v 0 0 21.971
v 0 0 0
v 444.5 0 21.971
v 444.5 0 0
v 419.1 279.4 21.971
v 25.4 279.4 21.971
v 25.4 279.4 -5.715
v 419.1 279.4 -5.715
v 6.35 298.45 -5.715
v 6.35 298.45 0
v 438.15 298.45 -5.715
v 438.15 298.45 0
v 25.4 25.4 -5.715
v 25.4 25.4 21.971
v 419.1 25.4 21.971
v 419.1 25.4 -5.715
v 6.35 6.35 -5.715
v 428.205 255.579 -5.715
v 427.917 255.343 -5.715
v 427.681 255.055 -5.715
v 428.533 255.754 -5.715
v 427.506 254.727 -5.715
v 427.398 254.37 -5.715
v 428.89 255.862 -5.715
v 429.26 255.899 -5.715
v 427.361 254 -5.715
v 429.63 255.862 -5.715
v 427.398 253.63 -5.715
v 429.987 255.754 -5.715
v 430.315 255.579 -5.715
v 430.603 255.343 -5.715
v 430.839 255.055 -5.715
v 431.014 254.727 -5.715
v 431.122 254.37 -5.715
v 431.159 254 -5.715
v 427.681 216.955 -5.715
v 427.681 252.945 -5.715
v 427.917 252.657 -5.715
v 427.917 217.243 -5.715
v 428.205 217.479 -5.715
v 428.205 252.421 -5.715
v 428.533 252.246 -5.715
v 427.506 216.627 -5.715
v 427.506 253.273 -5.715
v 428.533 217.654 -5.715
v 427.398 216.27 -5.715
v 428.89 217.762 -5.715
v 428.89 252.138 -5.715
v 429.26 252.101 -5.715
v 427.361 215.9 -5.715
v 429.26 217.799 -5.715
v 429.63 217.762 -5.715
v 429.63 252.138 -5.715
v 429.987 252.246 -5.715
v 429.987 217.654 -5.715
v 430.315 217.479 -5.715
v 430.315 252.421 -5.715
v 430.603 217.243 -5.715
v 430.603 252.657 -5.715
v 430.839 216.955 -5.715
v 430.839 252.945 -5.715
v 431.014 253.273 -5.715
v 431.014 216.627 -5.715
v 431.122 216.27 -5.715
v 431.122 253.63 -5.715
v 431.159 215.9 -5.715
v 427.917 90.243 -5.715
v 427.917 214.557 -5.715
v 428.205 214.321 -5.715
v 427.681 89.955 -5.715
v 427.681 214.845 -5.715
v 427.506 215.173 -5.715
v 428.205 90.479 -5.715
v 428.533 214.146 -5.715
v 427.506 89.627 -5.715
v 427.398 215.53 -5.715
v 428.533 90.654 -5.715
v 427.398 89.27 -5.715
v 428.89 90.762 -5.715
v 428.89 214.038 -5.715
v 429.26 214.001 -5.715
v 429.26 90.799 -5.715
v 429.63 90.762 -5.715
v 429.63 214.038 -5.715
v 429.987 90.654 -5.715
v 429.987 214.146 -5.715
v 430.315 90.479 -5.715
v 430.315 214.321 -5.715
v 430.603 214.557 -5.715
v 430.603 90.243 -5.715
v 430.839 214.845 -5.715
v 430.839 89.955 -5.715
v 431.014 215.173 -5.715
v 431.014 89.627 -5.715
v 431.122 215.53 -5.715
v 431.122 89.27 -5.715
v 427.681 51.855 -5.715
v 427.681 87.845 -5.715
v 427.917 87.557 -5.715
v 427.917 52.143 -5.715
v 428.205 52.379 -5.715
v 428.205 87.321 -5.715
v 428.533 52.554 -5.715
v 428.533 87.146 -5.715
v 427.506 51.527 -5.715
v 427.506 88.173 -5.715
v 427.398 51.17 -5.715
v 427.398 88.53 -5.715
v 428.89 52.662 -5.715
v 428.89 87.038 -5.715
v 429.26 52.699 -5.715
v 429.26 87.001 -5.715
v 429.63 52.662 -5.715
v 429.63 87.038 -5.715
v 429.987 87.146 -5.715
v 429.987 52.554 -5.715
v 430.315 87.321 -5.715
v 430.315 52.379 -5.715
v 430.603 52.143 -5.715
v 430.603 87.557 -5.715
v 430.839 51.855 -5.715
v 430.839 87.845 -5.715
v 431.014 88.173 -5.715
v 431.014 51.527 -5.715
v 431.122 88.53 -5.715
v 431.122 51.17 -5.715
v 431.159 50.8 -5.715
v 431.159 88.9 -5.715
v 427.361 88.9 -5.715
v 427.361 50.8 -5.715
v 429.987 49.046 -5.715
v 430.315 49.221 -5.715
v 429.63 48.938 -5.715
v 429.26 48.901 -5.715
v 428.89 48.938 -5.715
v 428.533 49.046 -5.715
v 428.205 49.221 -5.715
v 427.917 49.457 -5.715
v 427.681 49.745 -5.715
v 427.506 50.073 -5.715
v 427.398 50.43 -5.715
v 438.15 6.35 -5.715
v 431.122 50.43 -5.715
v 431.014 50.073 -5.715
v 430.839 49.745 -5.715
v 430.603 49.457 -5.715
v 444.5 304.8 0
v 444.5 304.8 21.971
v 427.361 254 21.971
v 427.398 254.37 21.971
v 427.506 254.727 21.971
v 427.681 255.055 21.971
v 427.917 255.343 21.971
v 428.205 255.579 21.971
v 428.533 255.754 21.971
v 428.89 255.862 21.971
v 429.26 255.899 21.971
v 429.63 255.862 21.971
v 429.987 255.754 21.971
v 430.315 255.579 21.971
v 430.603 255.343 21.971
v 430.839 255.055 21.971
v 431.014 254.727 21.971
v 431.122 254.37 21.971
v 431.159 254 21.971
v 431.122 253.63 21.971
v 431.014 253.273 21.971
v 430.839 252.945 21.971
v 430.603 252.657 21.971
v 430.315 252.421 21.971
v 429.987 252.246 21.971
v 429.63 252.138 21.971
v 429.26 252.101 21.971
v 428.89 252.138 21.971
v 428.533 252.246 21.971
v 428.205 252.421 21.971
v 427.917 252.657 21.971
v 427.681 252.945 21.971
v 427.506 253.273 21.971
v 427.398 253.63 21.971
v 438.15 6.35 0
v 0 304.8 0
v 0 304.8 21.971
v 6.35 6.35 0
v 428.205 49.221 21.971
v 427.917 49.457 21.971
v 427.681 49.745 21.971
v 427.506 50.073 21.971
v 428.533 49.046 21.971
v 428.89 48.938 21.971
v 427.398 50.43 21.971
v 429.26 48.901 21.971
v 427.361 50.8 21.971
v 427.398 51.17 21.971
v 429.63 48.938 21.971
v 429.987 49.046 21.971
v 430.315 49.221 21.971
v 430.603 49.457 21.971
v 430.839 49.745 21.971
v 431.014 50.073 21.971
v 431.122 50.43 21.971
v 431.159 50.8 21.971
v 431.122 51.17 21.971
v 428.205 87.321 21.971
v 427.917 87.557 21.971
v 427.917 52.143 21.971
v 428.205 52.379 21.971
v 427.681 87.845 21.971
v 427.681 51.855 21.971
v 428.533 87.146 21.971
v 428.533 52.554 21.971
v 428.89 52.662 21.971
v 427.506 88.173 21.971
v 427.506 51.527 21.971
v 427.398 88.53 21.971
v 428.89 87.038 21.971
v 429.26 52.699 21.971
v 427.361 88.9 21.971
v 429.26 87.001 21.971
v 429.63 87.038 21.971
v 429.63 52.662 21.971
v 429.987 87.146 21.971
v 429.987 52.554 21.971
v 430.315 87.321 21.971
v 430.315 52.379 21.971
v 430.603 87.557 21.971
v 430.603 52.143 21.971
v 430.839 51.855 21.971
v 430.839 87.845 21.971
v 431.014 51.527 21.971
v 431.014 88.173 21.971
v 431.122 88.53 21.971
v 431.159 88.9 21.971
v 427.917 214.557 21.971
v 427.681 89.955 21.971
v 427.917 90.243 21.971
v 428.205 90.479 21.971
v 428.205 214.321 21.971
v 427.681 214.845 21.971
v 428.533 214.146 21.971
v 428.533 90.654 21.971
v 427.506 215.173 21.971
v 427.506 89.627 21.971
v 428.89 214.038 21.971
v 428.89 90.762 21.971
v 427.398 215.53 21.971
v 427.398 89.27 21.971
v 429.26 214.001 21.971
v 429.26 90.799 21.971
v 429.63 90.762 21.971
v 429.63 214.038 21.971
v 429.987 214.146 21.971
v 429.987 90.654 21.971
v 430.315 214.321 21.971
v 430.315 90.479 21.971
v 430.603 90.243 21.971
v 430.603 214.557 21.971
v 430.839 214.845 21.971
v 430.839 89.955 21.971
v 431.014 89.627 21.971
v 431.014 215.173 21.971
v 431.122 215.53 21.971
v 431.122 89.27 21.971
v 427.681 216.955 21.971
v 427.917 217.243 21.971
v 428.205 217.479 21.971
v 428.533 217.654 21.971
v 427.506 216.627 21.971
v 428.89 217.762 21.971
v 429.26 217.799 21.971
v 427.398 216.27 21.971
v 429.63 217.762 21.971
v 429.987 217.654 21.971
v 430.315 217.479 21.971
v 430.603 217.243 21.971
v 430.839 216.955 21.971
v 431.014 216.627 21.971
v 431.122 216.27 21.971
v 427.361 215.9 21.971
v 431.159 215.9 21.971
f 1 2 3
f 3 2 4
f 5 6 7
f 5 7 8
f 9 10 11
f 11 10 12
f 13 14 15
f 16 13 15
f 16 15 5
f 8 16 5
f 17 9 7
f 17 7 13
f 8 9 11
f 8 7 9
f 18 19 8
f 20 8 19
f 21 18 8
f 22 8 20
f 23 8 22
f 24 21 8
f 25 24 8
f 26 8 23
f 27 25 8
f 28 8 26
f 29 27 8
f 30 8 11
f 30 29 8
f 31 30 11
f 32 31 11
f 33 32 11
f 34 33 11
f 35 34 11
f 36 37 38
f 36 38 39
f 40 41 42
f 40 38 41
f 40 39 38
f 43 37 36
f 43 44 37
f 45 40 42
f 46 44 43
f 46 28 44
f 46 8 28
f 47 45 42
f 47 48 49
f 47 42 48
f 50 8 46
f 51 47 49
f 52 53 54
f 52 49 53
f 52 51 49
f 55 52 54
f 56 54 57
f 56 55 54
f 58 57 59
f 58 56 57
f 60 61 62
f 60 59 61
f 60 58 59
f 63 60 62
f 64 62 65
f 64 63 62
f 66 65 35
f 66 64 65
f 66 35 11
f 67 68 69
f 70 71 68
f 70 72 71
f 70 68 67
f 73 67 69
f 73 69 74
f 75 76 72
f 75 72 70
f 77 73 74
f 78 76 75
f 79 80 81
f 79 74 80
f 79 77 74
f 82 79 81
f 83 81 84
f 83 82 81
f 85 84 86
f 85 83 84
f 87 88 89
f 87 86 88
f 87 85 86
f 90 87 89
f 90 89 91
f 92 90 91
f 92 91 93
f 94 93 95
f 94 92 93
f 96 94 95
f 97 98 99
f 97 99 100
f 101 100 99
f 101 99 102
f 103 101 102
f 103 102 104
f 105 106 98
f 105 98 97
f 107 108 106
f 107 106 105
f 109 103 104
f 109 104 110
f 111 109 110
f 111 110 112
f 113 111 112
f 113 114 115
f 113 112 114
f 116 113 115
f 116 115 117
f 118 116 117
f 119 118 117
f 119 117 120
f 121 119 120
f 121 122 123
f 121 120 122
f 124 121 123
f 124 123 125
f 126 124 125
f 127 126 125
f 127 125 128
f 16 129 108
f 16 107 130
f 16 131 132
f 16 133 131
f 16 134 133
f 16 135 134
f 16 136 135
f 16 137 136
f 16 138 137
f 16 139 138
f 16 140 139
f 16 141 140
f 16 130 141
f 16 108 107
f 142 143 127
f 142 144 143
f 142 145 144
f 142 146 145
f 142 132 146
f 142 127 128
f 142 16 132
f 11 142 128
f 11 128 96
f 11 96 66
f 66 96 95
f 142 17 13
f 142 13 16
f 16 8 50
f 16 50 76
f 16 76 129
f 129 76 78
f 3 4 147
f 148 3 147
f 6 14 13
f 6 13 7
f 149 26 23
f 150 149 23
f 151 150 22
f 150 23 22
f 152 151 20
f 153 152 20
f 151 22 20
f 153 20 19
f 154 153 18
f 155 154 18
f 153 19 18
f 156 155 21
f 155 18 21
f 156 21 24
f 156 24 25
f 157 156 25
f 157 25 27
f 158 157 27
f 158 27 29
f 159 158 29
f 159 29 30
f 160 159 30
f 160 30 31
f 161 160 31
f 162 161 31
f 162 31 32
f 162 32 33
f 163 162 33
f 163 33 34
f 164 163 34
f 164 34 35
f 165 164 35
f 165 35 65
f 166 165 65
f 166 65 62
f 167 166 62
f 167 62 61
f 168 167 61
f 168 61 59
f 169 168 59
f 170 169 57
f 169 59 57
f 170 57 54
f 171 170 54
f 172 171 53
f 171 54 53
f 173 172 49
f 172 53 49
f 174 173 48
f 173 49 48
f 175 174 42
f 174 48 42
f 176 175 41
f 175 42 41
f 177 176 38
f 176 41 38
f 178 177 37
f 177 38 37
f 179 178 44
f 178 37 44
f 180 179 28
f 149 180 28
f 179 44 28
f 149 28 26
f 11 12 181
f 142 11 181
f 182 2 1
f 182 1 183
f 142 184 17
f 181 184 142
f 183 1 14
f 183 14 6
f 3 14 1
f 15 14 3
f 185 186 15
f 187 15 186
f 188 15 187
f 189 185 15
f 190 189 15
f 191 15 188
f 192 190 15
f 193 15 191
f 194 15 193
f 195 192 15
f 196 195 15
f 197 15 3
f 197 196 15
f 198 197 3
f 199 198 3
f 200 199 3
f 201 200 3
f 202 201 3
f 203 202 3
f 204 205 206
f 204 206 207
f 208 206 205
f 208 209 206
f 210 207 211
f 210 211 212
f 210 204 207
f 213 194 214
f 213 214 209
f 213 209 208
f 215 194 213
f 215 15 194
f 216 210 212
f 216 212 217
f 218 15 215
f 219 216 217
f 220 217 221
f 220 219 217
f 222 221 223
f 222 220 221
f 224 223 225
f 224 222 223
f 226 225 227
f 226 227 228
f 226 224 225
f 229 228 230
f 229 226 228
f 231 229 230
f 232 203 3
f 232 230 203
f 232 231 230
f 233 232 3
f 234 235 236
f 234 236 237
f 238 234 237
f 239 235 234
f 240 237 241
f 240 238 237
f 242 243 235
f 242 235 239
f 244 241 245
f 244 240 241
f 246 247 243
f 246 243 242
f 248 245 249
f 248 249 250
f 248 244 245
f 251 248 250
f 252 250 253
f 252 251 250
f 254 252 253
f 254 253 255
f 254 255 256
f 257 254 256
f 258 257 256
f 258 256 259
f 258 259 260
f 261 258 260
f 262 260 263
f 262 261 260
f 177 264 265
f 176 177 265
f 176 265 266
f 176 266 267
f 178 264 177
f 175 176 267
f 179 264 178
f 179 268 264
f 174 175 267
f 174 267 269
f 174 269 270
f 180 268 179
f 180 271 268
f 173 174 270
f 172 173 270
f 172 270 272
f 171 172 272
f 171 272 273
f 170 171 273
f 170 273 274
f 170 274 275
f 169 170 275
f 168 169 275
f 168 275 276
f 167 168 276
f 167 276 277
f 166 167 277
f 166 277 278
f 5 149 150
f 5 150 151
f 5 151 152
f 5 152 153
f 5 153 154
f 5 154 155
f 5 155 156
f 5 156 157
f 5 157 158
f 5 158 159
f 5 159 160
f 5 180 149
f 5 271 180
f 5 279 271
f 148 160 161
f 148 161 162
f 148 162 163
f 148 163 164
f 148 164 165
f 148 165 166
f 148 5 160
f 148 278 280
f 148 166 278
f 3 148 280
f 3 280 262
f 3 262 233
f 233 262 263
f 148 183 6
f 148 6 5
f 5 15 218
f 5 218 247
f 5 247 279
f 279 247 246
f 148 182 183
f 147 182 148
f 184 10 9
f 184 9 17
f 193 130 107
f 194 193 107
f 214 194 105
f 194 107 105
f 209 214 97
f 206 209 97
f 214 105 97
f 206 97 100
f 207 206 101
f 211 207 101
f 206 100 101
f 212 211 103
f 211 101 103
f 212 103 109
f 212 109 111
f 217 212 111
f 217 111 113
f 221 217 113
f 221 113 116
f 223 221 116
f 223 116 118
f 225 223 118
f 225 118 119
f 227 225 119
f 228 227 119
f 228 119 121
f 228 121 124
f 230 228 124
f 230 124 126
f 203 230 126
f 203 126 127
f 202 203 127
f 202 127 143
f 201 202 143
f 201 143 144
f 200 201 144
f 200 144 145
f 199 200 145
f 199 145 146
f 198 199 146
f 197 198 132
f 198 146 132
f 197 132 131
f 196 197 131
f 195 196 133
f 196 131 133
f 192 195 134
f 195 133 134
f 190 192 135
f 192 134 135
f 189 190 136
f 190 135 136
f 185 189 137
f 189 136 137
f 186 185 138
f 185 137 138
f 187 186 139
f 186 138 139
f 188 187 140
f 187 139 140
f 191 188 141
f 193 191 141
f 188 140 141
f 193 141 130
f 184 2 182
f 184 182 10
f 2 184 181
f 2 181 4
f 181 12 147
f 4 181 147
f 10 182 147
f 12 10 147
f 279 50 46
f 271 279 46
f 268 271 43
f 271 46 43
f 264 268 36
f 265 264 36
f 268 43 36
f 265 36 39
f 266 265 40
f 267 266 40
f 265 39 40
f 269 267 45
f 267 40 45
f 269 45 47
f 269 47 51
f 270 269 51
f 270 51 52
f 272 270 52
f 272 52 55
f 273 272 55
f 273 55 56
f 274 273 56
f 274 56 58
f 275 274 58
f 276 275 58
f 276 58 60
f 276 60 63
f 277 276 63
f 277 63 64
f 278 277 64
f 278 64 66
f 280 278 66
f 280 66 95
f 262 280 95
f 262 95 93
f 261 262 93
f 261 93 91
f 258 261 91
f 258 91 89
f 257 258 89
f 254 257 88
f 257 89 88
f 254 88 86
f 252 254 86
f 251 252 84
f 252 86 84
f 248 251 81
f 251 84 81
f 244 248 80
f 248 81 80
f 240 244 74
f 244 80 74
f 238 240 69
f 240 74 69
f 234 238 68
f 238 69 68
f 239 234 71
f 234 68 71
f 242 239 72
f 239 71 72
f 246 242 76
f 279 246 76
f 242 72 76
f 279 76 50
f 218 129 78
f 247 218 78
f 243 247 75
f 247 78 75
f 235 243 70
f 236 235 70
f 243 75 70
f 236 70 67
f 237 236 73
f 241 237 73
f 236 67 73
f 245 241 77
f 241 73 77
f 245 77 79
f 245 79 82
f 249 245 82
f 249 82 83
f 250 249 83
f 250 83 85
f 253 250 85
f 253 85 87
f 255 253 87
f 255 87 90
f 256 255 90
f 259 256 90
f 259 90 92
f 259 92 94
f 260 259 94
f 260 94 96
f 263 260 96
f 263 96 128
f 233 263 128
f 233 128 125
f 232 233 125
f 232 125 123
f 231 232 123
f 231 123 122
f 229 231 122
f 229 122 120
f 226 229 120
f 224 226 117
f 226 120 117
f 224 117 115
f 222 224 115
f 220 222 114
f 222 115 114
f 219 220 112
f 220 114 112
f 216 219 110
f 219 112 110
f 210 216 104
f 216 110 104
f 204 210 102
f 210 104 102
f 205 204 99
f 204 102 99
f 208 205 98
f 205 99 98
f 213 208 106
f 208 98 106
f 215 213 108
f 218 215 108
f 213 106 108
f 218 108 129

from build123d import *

# Parameters (mm, degrees)
F0_W     = 444.5
F0_H     = 304.8
F1_DEPTH = 21.971
F2_W     = 431.8
F2_H     = 292.1
F3_DEPTH = 5.715
F5_W     = 393.7
F5_H     = 254
F6_DEPTH = 27.687
F9_D     = 3.7973


with BuildPart() as f1:
    # F0 (on Top) → F1 (new body)
    with BuildSketch(Plane.XY):
        with Locations((222.25, 152.4)):
            Rectangle(F0_W, F0_H)
    extrude(amount=F1_DEPTH)

    # F2 (on face) → F3 (join)
    with BuildSketch(Plane(origin=(0, 0, 0), x_dir=(1, 0, 0), z_dir=(0, 0, -1))):
        with Locations((222.25, -152.4)):
            Rectangle(F2_W, F2_H)
    extrude(amount=F3_DEPTH)

    # F5 (on face) → F6 (cut, through all)
    with BuildSketch(Plane.XY.offset(21.971)):
        with Locations((222.25, 152.4)):
            Rectangle(F5_W, F5_H)
    extrude(amount=-F6_DEPTH, mode=Mode.SUBTRACT)

    # F9 (through all)
    with Locations(Plane.XY.offset(21.971)):
        with Locations((429.26, 254), (429.26, 215.9), (429.26, 88.9), (429.26, 50.8)):
            Hole(F9_D / 2)


solid = f1.part
